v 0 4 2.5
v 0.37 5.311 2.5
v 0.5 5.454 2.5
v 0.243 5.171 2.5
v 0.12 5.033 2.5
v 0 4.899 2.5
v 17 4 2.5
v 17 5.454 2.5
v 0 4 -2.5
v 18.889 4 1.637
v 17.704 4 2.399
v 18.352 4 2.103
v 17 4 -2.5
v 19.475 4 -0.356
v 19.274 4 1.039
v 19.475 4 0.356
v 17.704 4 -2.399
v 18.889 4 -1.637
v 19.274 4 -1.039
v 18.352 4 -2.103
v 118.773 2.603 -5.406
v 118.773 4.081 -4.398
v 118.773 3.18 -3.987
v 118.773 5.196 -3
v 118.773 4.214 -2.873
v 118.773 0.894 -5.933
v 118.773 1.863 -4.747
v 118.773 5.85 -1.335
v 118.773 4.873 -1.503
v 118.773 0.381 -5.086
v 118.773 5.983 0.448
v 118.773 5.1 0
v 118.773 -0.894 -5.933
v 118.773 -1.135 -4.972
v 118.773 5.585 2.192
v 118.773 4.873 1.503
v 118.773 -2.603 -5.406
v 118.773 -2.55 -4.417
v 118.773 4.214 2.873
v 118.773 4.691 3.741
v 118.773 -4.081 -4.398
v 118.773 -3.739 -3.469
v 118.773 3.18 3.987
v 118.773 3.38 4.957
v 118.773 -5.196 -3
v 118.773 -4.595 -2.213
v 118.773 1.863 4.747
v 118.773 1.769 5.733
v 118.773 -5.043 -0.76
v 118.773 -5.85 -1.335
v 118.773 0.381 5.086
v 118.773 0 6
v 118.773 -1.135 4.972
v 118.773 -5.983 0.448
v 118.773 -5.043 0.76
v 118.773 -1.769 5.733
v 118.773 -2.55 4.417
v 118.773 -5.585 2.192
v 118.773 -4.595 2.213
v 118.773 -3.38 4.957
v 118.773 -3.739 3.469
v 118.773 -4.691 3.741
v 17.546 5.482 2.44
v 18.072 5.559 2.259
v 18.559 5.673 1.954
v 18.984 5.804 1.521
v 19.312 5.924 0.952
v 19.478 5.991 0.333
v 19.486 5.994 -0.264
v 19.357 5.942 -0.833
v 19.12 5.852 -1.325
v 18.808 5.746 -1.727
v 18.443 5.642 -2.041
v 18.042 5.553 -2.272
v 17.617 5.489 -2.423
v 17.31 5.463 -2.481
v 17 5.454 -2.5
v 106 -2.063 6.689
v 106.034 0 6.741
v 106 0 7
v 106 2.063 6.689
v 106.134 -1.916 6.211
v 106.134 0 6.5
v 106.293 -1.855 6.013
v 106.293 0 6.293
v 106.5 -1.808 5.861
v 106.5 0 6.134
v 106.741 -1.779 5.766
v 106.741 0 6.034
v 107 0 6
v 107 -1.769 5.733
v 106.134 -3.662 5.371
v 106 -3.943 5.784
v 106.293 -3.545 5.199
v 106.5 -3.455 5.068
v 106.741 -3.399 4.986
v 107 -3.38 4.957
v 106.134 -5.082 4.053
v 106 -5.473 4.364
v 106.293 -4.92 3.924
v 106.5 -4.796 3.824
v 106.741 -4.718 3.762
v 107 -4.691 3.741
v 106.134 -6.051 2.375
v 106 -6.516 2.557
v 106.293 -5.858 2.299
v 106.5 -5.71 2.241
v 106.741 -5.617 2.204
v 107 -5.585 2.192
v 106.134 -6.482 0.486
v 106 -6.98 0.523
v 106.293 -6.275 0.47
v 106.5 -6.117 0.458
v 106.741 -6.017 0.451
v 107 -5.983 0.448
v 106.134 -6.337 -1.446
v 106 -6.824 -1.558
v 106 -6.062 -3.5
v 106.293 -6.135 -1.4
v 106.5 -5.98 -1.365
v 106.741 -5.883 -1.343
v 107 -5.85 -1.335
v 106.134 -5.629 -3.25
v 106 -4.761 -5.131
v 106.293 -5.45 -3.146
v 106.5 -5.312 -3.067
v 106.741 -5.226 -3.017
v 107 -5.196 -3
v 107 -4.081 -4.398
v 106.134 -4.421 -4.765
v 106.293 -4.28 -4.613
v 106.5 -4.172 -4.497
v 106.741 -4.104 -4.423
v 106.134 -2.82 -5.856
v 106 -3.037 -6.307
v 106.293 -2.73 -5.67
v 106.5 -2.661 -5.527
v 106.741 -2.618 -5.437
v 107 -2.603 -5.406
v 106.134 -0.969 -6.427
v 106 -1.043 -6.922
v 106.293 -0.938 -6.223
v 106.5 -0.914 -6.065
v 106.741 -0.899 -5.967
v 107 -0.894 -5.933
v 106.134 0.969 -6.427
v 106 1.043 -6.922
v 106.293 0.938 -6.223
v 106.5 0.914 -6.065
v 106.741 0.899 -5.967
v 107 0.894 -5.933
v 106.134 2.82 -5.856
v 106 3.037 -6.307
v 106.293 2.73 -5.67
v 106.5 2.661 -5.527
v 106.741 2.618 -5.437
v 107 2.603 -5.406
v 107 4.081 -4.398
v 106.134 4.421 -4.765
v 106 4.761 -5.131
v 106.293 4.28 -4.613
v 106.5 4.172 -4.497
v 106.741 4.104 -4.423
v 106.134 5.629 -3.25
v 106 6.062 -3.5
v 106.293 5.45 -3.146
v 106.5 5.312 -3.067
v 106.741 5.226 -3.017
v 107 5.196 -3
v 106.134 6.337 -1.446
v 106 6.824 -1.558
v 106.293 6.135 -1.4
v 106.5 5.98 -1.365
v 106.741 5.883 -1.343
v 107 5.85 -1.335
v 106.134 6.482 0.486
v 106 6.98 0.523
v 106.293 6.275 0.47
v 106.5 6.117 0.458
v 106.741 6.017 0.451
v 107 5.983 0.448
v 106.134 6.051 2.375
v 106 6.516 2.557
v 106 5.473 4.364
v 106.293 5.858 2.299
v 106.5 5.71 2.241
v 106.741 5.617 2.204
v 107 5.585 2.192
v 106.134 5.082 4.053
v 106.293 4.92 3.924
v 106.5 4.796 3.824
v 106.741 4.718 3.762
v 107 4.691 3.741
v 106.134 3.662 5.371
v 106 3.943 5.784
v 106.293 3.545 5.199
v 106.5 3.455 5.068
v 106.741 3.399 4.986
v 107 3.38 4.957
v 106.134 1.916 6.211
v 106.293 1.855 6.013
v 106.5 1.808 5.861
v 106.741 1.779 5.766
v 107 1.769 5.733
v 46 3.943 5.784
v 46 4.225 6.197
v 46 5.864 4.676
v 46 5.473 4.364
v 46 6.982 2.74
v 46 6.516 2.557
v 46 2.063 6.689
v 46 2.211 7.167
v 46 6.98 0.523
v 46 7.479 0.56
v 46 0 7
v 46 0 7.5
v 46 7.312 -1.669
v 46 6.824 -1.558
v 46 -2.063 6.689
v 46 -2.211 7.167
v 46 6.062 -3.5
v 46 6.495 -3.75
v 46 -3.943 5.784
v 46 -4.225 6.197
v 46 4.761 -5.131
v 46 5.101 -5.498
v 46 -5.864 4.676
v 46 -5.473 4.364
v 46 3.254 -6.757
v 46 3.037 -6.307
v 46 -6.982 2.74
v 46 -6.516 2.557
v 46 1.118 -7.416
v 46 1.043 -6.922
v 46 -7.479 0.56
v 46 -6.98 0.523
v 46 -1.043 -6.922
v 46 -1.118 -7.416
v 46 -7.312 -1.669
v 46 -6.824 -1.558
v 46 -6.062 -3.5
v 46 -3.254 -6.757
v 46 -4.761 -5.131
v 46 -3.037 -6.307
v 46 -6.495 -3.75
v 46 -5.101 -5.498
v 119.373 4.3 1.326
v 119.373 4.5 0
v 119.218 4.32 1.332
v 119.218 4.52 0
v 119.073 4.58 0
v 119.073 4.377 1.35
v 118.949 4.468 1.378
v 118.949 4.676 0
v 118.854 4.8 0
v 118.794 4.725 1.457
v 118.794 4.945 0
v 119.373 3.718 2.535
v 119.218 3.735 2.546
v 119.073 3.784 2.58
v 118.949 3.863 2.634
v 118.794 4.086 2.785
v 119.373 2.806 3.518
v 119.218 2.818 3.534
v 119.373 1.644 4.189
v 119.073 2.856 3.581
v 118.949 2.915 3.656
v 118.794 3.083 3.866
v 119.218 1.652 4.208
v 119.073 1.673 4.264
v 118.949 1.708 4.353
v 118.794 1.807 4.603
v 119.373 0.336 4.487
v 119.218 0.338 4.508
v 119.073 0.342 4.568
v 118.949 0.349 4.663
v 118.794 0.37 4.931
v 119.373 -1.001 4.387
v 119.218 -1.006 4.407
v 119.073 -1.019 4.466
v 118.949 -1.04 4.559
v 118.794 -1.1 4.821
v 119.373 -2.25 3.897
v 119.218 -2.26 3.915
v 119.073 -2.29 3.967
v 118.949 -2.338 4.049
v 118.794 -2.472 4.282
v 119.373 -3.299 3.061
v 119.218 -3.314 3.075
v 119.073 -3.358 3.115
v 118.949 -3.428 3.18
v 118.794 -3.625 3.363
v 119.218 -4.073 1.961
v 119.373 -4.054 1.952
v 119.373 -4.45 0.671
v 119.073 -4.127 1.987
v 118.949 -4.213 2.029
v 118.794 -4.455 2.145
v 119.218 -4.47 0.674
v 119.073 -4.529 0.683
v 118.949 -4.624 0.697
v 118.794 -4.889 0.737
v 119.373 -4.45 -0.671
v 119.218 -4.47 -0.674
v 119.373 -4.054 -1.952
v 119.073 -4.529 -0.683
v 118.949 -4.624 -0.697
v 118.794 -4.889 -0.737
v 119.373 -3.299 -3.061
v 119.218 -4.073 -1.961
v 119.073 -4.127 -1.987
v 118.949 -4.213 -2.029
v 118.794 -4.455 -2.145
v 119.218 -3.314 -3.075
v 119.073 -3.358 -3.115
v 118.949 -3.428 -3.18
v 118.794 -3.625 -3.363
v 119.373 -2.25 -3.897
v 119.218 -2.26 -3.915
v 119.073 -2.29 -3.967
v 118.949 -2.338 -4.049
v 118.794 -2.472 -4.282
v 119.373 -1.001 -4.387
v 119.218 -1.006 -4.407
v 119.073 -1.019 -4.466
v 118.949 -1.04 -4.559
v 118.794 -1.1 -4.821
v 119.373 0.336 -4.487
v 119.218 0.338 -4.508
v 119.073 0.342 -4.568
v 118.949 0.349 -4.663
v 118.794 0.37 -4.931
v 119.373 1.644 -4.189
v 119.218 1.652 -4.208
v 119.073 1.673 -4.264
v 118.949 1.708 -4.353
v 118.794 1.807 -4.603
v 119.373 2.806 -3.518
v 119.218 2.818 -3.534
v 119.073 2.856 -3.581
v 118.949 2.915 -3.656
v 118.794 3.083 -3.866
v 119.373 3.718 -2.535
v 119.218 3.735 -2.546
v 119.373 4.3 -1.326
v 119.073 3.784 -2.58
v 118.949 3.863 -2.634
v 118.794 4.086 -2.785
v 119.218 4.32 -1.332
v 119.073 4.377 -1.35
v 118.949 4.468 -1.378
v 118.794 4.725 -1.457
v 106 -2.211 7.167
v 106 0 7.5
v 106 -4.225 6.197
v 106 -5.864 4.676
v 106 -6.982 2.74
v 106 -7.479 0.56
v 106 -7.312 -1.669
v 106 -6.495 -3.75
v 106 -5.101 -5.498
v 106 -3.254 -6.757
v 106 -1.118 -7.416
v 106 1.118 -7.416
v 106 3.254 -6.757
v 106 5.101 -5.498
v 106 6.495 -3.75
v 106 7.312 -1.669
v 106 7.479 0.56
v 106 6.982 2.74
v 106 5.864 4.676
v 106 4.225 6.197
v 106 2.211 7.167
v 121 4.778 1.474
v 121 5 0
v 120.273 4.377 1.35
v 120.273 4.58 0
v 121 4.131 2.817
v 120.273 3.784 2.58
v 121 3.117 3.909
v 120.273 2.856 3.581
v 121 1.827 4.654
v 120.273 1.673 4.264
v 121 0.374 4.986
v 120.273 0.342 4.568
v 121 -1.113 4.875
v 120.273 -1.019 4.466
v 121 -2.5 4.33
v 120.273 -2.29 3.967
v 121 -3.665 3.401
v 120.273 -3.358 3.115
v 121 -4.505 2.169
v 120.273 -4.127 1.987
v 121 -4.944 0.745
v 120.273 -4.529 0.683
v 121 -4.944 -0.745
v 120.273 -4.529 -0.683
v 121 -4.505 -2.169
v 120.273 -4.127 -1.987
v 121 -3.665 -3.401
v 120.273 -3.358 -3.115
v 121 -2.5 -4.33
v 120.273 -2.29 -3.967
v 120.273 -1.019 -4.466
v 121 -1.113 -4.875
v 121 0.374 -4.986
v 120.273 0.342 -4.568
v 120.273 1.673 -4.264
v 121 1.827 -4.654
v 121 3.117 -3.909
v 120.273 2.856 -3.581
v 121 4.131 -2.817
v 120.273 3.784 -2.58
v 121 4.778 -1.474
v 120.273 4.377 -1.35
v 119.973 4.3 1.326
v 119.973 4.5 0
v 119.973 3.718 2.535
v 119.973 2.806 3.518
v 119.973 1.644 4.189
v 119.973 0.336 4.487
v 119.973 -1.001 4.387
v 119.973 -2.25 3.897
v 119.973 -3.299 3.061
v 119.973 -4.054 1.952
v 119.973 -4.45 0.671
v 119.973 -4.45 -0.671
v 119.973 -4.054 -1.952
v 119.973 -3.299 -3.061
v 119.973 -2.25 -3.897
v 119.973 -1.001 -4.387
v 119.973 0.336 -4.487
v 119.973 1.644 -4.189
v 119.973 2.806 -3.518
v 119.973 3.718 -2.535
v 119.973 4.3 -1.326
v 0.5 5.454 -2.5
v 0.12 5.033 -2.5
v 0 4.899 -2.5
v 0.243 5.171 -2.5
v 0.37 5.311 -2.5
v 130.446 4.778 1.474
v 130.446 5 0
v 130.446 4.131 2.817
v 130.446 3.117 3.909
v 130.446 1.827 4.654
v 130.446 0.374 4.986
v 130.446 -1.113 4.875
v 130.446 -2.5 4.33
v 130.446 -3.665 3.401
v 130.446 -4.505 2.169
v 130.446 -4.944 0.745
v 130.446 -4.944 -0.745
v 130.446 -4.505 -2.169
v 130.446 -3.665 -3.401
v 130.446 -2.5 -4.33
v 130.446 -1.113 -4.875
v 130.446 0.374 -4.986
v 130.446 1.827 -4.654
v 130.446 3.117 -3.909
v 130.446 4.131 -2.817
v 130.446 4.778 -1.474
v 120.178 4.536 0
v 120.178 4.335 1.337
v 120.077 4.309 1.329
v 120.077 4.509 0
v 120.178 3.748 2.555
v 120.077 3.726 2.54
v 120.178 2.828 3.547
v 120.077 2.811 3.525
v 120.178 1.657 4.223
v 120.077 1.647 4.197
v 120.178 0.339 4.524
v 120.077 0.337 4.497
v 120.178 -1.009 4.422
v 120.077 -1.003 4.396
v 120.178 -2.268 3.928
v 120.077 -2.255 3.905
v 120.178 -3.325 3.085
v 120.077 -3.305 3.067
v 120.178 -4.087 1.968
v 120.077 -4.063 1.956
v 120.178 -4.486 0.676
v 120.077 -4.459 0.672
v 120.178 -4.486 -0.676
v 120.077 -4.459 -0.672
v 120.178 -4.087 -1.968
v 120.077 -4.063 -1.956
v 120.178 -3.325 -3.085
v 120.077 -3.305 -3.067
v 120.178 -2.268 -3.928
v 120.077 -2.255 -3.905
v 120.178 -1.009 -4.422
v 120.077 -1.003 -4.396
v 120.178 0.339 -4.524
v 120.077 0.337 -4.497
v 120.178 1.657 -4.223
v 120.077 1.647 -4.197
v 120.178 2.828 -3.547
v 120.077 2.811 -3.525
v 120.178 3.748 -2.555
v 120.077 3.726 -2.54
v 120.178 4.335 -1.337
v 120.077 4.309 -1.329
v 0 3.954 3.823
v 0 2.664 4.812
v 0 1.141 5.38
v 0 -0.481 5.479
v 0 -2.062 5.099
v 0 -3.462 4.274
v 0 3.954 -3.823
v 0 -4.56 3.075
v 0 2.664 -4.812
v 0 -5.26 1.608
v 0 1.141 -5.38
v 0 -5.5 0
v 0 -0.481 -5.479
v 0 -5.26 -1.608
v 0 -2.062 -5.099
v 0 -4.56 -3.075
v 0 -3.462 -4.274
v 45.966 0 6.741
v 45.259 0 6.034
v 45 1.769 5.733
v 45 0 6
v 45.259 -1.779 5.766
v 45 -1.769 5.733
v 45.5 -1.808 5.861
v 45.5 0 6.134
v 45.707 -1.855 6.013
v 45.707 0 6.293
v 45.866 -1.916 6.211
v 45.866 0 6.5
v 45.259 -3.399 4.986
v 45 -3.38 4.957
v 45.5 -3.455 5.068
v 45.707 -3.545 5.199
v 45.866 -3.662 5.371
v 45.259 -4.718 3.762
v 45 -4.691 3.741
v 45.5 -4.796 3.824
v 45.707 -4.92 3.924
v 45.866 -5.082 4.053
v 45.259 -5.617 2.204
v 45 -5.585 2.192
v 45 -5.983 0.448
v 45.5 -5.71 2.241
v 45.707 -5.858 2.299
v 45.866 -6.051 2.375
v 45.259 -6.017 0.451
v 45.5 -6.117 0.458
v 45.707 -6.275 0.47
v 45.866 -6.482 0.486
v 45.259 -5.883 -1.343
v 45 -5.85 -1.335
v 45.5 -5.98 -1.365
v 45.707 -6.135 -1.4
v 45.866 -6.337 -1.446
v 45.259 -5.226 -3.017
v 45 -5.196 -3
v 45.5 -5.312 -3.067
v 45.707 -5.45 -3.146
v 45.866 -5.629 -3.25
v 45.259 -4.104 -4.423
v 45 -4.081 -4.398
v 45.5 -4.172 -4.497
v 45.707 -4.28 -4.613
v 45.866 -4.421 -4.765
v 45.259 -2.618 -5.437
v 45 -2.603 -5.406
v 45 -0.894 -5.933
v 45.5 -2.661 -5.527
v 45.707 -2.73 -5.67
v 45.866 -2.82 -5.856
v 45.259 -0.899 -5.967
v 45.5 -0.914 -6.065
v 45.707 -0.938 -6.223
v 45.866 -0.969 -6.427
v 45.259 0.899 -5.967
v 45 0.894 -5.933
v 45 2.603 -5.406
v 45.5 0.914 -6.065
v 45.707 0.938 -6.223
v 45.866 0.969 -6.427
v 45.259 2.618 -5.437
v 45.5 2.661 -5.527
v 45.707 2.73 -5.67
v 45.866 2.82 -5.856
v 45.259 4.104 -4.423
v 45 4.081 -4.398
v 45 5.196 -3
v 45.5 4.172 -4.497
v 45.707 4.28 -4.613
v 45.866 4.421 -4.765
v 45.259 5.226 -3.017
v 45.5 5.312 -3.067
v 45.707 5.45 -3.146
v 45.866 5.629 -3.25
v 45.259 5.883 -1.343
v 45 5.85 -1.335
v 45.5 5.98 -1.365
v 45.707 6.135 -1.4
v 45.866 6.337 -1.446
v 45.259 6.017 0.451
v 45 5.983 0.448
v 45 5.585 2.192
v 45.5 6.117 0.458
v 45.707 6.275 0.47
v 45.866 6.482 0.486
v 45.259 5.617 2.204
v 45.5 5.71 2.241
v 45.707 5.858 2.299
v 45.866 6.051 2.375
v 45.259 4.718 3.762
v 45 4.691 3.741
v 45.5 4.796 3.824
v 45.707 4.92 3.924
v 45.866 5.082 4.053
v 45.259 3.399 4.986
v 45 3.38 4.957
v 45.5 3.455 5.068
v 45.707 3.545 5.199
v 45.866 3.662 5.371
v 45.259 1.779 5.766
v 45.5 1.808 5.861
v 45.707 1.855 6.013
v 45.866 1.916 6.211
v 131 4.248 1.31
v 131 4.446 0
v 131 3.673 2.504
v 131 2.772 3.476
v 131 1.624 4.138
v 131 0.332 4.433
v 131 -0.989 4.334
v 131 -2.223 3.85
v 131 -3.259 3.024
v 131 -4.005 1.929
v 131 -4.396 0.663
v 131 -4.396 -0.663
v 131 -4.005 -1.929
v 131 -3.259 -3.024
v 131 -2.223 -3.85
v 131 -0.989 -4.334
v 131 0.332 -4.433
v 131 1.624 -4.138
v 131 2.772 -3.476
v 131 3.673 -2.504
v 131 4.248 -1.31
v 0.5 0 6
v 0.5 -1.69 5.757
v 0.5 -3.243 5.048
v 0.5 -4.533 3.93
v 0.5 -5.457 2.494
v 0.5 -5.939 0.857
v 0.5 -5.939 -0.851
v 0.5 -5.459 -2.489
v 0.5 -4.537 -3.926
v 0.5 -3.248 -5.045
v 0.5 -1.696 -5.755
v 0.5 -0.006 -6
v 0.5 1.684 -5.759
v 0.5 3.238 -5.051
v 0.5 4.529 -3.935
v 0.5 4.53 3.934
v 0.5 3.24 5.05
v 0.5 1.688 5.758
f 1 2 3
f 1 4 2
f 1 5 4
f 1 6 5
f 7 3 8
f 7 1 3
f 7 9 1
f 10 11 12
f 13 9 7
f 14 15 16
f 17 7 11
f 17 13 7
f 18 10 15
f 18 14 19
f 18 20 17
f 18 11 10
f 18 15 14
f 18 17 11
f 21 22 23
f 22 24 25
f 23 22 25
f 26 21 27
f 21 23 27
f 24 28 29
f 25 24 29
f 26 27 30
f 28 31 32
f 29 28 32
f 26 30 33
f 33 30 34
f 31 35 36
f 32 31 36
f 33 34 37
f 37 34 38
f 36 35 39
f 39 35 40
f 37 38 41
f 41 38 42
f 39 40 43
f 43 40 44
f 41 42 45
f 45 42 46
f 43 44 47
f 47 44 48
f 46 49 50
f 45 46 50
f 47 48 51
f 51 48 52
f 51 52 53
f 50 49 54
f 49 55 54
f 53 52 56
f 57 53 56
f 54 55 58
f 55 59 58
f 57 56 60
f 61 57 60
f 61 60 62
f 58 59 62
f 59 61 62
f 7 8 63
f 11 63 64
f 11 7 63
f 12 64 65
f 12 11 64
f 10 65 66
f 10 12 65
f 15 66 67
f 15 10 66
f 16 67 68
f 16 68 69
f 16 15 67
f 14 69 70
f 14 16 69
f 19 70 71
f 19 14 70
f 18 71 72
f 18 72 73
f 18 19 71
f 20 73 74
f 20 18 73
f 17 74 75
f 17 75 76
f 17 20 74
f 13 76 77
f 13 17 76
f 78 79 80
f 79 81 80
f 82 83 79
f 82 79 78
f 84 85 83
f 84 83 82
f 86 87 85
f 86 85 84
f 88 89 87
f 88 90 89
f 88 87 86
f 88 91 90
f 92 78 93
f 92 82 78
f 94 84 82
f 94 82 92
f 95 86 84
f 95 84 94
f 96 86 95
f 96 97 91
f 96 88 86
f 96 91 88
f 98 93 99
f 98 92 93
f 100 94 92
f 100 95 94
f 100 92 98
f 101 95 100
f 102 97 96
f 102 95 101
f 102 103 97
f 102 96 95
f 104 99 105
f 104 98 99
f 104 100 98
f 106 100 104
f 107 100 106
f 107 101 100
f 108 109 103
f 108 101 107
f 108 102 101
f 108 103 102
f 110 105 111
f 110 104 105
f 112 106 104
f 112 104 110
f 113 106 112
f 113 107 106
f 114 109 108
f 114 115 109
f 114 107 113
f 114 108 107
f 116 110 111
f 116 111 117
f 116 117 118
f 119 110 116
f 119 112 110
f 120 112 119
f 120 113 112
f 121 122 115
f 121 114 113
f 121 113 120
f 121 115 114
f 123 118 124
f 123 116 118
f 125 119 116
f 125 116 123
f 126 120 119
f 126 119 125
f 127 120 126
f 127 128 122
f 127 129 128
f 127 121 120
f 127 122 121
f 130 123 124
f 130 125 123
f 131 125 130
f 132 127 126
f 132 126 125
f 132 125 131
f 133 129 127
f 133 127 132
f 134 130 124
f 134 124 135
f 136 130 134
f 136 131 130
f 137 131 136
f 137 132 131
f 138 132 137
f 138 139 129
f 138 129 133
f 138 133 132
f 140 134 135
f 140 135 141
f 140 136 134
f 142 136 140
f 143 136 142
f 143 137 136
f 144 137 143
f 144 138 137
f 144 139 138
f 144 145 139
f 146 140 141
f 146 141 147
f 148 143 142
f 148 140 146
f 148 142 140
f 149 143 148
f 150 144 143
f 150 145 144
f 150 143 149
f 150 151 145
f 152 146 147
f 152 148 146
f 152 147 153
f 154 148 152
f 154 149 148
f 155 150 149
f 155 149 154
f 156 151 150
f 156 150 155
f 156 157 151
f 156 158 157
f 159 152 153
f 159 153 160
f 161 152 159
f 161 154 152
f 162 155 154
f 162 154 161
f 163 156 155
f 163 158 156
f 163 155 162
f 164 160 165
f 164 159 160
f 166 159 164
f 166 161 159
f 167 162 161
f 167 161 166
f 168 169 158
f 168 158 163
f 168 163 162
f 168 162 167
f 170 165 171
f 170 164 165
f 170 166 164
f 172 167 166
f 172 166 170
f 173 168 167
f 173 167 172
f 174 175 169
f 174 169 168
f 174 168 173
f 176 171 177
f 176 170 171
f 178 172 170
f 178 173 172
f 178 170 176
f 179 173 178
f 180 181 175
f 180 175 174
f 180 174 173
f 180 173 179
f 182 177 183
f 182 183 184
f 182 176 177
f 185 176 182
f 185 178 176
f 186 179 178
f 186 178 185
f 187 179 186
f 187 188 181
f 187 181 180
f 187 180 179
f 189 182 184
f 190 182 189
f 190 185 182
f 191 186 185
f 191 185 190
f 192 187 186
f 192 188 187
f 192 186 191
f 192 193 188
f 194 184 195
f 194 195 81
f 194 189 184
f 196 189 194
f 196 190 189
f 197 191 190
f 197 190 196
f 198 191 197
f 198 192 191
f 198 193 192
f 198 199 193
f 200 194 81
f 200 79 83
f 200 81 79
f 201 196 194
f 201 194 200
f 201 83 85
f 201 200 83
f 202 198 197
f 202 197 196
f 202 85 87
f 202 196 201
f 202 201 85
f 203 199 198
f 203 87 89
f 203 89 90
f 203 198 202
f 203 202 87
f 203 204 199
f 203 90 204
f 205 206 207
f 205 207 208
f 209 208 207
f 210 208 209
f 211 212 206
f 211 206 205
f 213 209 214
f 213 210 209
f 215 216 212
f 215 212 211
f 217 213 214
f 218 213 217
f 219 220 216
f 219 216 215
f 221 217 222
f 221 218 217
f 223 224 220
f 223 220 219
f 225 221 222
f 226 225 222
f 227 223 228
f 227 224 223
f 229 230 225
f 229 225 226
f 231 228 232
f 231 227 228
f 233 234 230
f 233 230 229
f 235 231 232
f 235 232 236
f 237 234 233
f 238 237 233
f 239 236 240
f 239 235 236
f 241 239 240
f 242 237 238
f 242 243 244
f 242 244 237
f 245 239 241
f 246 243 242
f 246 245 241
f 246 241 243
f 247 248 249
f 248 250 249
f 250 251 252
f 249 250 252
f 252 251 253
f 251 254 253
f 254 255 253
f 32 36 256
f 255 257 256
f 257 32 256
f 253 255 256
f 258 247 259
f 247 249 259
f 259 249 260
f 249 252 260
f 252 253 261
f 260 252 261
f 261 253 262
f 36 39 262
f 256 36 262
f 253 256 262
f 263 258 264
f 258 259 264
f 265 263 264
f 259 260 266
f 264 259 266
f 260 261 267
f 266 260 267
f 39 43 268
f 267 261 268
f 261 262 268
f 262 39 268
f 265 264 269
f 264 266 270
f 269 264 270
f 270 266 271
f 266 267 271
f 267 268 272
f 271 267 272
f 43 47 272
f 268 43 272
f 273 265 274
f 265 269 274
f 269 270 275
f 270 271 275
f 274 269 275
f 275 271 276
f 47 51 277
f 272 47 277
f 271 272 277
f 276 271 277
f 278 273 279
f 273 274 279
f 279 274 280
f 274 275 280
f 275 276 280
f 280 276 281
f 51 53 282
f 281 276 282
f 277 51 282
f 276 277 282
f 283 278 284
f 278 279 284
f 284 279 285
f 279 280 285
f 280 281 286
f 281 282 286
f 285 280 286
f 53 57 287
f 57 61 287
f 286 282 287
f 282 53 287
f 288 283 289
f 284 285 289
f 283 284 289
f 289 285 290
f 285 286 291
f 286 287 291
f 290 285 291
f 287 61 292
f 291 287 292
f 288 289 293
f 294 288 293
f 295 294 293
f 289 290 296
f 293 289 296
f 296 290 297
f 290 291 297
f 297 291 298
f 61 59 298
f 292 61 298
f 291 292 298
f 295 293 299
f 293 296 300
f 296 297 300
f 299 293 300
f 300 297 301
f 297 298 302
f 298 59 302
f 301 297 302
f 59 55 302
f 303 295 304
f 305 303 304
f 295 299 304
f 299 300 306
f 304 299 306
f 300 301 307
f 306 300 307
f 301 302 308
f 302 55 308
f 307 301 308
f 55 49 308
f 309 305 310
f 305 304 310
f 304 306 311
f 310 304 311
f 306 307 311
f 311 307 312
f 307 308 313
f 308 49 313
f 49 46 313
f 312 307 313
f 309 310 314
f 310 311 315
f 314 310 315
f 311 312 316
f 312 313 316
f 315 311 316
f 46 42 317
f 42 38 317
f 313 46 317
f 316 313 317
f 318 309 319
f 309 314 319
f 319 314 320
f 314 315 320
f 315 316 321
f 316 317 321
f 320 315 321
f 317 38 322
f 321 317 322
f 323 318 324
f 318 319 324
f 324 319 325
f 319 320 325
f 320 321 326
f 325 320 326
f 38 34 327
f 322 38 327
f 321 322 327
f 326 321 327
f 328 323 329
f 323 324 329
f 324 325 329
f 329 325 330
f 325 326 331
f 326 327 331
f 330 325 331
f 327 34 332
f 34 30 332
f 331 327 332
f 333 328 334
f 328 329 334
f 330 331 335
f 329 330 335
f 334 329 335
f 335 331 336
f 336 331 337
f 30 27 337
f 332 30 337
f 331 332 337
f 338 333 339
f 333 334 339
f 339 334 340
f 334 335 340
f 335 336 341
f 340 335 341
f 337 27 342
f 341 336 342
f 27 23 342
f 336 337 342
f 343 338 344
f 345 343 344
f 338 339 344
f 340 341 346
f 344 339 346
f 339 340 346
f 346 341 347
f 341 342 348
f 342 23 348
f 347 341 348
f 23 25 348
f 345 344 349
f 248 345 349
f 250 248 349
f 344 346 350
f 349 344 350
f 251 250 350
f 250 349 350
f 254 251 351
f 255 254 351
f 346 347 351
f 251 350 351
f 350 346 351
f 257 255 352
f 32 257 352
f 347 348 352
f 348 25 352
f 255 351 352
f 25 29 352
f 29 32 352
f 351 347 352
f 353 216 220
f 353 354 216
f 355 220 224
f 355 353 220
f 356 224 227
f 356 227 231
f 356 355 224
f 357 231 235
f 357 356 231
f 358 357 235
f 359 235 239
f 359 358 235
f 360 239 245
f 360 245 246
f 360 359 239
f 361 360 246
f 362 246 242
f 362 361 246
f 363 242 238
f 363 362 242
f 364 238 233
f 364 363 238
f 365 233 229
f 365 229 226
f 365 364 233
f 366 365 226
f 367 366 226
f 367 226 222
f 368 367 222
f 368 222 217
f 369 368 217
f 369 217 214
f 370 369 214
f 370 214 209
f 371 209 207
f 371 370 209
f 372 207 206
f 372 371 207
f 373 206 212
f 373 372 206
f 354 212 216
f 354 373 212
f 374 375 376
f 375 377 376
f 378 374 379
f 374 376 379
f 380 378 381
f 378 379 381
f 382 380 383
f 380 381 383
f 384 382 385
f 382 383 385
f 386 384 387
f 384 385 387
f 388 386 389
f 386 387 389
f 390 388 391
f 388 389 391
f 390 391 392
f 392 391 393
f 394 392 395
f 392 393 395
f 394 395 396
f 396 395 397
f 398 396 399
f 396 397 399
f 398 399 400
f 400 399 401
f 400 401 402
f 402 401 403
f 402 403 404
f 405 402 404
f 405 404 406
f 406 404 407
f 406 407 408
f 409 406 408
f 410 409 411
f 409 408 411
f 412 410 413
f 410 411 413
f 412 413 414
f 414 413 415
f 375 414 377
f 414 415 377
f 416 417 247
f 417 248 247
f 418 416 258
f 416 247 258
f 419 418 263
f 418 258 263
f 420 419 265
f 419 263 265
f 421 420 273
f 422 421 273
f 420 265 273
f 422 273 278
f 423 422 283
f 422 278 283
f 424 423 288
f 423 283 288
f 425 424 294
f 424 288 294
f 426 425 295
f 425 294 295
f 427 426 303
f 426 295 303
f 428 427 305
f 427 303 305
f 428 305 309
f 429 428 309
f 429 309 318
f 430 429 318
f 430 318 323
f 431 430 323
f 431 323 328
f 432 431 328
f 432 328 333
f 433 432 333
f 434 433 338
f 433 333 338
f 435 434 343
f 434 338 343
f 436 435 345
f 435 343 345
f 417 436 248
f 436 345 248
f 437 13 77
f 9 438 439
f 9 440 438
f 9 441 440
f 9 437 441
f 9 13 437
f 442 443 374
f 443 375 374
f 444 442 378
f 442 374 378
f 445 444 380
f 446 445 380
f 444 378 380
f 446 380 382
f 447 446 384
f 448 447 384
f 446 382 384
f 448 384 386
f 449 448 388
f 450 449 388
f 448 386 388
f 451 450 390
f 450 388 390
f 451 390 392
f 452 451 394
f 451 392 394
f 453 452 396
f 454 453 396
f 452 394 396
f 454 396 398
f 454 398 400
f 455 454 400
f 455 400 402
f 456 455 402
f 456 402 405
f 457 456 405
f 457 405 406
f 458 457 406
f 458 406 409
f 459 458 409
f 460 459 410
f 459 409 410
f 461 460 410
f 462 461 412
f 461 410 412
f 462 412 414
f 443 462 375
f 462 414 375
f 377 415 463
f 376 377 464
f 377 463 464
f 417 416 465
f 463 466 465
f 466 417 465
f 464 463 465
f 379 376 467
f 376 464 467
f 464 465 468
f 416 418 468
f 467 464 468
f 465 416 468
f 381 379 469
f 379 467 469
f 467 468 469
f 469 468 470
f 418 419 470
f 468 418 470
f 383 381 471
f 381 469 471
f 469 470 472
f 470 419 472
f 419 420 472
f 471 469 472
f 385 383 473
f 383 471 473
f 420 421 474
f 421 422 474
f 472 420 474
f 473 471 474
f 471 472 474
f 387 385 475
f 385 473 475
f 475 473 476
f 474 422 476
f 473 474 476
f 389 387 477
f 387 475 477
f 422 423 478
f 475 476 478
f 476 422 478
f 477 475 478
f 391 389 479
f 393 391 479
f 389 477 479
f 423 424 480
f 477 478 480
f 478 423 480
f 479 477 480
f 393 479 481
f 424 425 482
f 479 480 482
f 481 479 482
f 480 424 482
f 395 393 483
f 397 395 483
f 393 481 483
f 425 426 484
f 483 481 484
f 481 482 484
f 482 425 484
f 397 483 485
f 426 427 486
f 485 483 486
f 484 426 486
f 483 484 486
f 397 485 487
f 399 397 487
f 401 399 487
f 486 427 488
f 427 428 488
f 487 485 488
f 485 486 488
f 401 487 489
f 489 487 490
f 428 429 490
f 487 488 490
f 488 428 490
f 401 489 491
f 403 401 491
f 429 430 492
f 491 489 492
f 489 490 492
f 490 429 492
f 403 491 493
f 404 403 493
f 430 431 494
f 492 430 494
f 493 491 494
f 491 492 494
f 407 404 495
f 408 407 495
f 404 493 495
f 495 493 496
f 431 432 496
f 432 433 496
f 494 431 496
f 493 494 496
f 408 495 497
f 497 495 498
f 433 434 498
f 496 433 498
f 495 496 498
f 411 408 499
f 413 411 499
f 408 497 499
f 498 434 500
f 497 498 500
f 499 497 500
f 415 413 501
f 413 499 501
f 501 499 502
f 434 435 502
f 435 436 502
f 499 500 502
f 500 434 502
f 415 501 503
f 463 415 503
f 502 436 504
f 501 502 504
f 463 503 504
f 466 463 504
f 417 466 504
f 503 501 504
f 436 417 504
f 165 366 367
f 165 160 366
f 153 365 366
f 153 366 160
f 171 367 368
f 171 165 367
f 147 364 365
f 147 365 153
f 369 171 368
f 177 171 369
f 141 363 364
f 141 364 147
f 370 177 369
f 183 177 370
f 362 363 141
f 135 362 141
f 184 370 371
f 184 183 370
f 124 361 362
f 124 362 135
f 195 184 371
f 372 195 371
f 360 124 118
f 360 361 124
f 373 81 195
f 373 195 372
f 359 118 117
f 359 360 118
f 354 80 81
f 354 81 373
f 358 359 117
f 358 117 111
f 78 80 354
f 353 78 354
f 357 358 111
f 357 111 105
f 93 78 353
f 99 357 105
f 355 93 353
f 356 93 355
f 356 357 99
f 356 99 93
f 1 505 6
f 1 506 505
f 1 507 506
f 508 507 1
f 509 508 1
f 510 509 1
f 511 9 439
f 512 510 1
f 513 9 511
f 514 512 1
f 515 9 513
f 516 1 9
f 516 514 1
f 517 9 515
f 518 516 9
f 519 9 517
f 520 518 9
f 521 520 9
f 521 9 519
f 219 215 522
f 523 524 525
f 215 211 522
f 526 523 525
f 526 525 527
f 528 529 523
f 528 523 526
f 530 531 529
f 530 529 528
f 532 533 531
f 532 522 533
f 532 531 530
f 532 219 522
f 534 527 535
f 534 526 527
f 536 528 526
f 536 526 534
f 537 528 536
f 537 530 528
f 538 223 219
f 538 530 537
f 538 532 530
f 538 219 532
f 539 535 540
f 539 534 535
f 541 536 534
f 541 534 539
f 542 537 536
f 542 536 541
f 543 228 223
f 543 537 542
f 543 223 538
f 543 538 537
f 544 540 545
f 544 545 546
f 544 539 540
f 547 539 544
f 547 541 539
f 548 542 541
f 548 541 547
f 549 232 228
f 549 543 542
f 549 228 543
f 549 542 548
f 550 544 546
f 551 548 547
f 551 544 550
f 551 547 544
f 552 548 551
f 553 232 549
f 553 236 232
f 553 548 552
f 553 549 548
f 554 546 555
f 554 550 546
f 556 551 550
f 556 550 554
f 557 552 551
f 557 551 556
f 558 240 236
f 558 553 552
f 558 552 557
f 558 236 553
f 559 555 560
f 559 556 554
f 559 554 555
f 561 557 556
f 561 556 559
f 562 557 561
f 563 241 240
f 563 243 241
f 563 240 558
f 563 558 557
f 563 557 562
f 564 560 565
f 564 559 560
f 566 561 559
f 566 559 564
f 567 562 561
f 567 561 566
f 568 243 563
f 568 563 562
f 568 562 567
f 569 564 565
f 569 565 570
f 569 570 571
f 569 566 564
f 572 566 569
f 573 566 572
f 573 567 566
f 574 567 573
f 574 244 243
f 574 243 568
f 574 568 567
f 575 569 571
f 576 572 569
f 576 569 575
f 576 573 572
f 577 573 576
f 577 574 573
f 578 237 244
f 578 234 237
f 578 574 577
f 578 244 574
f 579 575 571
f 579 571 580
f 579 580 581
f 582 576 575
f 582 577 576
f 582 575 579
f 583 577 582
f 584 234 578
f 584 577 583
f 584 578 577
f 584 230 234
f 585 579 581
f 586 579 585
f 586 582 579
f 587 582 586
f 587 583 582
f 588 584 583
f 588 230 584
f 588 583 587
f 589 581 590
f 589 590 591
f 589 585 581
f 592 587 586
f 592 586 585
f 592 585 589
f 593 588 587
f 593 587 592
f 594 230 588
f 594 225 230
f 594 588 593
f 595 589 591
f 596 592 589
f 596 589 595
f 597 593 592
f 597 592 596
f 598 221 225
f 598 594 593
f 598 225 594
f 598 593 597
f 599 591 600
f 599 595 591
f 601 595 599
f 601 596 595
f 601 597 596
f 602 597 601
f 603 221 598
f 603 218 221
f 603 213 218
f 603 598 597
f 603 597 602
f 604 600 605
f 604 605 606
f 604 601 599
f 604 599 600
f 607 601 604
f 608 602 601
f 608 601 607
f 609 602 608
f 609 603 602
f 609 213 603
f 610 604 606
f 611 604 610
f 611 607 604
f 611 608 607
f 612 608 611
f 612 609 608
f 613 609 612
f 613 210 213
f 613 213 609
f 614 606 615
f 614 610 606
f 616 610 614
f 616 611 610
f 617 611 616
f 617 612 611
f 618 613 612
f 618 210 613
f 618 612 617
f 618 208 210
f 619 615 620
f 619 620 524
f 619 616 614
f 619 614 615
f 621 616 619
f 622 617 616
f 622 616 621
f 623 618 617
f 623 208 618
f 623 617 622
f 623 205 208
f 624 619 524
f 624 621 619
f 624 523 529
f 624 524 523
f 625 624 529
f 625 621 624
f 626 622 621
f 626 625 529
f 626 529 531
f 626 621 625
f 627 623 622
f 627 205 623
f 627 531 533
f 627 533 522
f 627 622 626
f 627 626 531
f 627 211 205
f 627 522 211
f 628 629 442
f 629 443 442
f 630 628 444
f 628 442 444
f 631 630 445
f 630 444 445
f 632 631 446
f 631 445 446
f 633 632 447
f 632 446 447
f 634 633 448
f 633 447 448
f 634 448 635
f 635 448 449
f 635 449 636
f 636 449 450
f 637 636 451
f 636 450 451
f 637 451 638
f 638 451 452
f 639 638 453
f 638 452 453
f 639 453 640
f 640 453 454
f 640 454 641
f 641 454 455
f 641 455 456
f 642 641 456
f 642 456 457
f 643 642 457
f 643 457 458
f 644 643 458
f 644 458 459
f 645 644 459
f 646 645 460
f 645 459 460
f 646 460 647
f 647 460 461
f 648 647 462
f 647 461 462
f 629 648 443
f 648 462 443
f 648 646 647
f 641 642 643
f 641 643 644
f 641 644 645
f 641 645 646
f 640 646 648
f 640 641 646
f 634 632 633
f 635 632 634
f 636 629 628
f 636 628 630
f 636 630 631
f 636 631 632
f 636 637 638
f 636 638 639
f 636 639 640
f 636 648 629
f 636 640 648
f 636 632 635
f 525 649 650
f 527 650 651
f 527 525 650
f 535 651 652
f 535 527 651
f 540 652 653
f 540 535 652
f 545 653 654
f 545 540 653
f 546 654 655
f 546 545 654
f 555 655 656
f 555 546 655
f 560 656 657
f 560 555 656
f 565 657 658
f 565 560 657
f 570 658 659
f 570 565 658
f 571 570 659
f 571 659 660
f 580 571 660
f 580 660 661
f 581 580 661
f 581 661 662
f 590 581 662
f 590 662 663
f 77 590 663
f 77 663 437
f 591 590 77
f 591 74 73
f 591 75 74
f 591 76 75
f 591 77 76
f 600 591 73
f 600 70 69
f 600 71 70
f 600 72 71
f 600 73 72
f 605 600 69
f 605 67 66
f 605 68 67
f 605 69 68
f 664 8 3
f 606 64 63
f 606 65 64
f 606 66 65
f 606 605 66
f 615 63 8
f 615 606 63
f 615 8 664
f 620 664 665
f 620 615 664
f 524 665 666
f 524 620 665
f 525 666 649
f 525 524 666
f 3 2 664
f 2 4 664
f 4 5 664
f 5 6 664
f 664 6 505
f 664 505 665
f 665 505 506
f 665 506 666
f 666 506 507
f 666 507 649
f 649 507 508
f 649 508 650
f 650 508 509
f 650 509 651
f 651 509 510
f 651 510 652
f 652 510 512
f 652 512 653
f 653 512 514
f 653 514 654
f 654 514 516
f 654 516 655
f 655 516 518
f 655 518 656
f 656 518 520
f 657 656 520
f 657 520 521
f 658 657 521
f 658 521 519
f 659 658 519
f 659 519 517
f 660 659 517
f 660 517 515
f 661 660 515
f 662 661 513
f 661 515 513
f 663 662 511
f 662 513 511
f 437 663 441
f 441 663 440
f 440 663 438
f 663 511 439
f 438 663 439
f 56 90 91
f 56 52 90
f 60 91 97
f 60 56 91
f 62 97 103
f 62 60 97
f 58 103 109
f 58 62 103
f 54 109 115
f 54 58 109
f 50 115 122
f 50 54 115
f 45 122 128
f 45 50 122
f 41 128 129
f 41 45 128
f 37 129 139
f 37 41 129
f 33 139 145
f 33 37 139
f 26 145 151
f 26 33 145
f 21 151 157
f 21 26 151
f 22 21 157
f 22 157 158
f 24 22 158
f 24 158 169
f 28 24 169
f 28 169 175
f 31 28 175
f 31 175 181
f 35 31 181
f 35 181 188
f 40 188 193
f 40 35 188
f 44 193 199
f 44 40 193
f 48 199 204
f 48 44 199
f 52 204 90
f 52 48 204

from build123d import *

# Parameters (mm, degrees)
FILLET1_R          = 1
CHAMFER2_SIZE      = 0.5
CUT_EXTRUDE1_START = 4
CUT_EXTRUDE1_DEPTH = 128.428687888


# Read off the part's stored shape, not the designer's step: M10x1.0 Machine Threads Stud1
with BuildPart() as part:
    # Sketch1 → Revolve1 (revolve)
    with BuildSketch(Plane(origin=(0, 0, 0), x_dir=(1, 0, 0), z_dir=(0, 1, 0))):
        Polygon((0, 0), (0, -6), (46, -6), (46, -7.5), (106, -7.5), (106, -6), (131, -6), (131, 0), align=None)
    revolve(axis=Axis((0, 0, 0), (1, 0, 0)))

    # Fillet1
    fillet1_edges = [part.edges().sort_by_distance(p)[0] for p in [
        (106, 0, -6),
        (46, 0, -6),
    ]]
    fillet(fillet1_edges, radius=FILLET1_R)

    # M10x1.0 Machine Threads Stud1 outline → M10x1.0 Machine Threads Stud1 (revolve, cut)
    with BuildSketch(Plane.YX):
        with BuildLine():
            Line((6, 131), (4.4455, 131))
            Line((4.4455, 131), (5, 130.4455))
            Line((5, 130.4455), (5, 121))
            Line((5, 121), (4.580384758, 120.273205081))
            ThreePointArc((4.580384758, 120.273205081), (4.520444504, 120.128496508), (4.5, 119.973205081))
            Line((4.5, 119.973205081), (4.5, 119.373205081))
            ThreePointArc((4.5, 119.373205081), (4.675735931, 118.948941012), (5.1, 118.773205081))
            Line((5.1, 118.773205081), (6, 118.773205081))
            Line((6, 118.773205081), (6, 131))
        make_face()
    revolve(axis=Axis((0, 0, 0), (1, 0, 0)), mode=Mode.SUBTRACT)

    # Chamfer2
    chamfer2_edges = [part.edges().sort_by_distance(p)[0] for p in [
        (0, 0, -6),
    ]]
    chamfer(chamfer2_edges, length=CHAMFER2_SIZE)

    # Sketch3 → Cut-Extrude1 (cut, through all)
    with BuildSketch(Plane(origin=(0, 0, 0), x_dir=(1, 0, 0), z_dir=(0, 1, 0)).offset(CUT_EXTRUDE1_START)):
        with BuildLine():
            Line((-17, -2.5), (17, -2.5))
            ThreePointArc((17, -2.5), (19.5, 0), (17, 2.5))
            Line((17, 2.5), (-17, 2.5))
            Line((-17, 2.5), (-17, -2.5))
        make_face()
    extrude(amount=CUT_EXTRUDE1_DEPTH, mode=Mode.SUBTRACT)


solid = part.part
